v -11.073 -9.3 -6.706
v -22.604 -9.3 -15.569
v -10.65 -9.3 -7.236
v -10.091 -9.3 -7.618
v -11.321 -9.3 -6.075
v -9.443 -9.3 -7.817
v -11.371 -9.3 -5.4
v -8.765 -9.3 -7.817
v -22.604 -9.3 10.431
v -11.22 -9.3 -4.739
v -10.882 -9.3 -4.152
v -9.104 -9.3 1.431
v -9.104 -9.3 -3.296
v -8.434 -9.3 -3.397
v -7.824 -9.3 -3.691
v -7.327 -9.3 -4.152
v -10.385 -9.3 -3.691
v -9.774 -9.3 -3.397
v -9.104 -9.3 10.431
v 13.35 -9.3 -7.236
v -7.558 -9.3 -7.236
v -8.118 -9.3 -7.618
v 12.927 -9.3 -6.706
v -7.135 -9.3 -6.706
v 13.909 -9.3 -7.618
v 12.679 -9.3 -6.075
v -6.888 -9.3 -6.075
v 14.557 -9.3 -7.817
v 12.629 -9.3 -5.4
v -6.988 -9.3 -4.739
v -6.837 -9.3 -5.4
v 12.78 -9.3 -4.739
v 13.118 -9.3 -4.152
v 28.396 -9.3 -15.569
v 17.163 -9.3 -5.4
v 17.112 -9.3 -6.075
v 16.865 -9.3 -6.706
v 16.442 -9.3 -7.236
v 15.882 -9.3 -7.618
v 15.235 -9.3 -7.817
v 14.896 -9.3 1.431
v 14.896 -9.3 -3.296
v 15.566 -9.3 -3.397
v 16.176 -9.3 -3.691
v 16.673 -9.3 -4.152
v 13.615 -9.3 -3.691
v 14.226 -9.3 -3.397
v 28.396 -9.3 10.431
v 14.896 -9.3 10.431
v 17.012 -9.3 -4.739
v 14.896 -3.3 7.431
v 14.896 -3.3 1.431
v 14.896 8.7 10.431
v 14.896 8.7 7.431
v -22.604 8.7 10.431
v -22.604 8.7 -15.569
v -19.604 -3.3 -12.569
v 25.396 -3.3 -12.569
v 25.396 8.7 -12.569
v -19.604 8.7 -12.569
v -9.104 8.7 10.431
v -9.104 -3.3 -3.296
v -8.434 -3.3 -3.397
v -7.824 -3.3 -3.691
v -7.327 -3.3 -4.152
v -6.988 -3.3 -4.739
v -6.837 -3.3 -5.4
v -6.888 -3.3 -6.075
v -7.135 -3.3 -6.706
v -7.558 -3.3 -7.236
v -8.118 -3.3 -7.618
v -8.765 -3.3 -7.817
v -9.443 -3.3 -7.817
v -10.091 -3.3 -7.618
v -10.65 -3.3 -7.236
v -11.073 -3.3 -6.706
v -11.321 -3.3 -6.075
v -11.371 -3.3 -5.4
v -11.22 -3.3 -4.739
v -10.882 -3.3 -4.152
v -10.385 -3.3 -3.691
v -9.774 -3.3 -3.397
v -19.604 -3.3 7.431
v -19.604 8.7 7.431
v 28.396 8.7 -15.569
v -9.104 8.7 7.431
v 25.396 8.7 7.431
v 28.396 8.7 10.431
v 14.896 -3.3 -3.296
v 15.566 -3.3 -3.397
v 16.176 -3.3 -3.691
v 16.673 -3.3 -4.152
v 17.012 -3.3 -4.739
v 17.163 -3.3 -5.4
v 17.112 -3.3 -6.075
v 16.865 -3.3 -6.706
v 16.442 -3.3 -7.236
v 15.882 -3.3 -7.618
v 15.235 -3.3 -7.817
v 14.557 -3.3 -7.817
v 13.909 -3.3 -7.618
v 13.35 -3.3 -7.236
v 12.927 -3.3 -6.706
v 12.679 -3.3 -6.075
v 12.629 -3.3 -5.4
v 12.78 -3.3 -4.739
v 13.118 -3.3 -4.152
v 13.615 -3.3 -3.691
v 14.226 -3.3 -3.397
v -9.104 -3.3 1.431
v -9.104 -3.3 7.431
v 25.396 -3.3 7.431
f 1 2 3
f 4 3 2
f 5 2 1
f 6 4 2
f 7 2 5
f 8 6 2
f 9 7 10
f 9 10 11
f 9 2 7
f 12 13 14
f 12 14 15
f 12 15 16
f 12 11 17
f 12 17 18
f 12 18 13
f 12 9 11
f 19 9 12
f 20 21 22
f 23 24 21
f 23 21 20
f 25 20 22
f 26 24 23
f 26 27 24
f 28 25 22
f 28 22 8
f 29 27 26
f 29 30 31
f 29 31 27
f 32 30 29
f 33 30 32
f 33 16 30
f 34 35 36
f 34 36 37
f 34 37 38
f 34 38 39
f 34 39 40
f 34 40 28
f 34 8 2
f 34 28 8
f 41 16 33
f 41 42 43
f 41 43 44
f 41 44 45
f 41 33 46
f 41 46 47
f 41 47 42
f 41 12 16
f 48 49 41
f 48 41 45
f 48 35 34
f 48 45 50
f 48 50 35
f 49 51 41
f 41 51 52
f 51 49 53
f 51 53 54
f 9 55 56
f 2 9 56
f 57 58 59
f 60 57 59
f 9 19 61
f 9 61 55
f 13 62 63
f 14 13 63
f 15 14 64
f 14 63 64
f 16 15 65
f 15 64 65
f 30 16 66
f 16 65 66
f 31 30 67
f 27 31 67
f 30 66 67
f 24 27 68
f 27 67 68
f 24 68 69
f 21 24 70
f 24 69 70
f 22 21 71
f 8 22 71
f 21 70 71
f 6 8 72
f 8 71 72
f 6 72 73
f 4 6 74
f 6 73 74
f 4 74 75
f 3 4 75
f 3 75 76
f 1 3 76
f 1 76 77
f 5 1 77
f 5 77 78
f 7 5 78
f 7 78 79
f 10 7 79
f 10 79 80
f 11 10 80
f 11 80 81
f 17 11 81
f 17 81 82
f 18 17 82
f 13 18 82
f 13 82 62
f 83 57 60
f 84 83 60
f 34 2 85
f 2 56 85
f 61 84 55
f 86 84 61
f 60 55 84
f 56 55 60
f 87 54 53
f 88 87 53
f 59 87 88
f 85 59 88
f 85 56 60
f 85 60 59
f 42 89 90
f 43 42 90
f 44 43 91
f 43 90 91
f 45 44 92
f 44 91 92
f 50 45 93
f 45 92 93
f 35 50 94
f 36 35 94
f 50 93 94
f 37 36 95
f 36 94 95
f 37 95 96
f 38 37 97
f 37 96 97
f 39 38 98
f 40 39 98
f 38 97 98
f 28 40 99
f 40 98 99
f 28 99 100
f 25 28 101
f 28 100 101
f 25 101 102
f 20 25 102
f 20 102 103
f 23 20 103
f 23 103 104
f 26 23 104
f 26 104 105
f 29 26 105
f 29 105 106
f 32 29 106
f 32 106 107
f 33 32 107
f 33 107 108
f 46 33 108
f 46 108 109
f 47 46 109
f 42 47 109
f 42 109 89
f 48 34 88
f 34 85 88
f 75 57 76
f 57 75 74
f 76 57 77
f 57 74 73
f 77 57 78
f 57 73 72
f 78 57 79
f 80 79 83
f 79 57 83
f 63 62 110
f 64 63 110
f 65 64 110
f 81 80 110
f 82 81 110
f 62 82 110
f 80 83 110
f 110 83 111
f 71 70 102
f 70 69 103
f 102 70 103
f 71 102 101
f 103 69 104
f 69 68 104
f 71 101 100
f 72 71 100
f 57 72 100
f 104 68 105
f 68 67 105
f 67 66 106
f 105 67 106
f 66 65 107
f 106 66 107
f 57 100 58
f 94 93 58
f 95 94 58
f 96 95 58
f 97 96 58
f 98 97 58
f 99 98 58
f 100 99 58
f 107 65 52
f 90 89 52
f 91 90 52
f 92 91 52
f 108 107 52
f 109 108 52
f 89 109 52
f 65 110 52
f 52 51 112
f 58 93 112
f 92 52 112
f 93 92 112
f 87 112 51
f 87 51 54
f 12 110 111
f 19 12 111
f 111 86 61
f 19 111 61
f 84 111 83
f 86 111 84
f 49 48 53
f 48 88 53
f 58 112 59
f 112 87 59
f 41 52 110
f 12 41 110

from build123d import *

# Parameters (mm, degrees)
BOSS_EXTRUDE10_DEPTH = 3
SKETCH12_W           = 3
SKETCH12_H           = 12
BOSS_EXTRUDE11_DEPTH = 48
BOSS_EXTRUDE12_REACH = 39.563
SKETCH13_W           = 3
SKETCH13_H           = 12
CUT_EXTRUDE1_DEPTH   = 3
BOSS_EXTRUDE13_DEPTH = 6
CUT_EXTRUDE2_REACH   = 36.536
SKETCH16_R           = 2.2733


with BuildPart() as part:
    # Sketch10 → Boss-Extrude10 (new body)
    with BuildSketch(Plane(origin=(25.395802875, 0, 0), x_dir=(0, 0, -1), z_dir=(1, 0, 0))):
        Polygon((12.569444444, -3.3), (15.569444444, -3.3), (15.569444444, 8.7), (12.569444444, 8.7), (-7.430555556, 8.7), (-10.430555556, 8.7), (-10.430555556, -3.3), (-7.430555556, -3.3), align=None)
    extrude(amount=BOSS_EXTRUDE10_DEPTH)

    # Sketch12 → Boss-Extrude11 (add)
    with BuildSketch(Plane.ZY.offset(-25.395802875)):
        with Locations((-14.069444444, 2.7)):
            Rectangle(SKETCH12_W, SKETCH12_H)
        with Locations((8.930555556, 2.7)):
            Rectangle(SKETCH12_W, SKETCH12_H)
    extrude(amount=BOSS_EXTRUDE11_DEPTH)

    # Sketch13 → Boss-Extrude12 (add, up to next)
    with BuildSketch(Plane.XY.offset(-12.569444444), mode=Mode.PRIVATE) as boss_extrude12_sk1:
        with Locations((-21.104197125, 2.7)):
            Rectangle(SKETCH13_W, SKETCH13_H)
    boss_extrude12_tool1 = extrude(boss_extrude12_sk1.sketch, amount=BOSS_EXTRUDE12_REACH, mode=Mode.PRIVATE) - part.part
    add(boss_extrude12_tool1.solids().sort_by_distance((-21.104197, 2.7, -12.569444))[0])

    # Sketch14 → Cut-Extrude1 (cut)
    with BuildSketch(Plane.XY.offset(10.430555556)):
        Polygon((2.895802875, 8.7), (14.895802875, 8.7), (14.895802875, -3.3), (-9.104197125, -3.3), (-9.104197125, 8.7), align=None)
    extrude(amount=-CUT_EXTRUDE1_DEPTH, mode=Mode.SUBTRACT)

    # Sketch15 → Boss-Extrude13 (add)
    with BuildSketch(Plane.XZ.offset(3.3)):
        Polygon((-22.604197125, 10.430555556), (-22.604197125, -15.569444444), (28.395802875, -15.569444444), (28.395802875, 10.430555556), (14.895802875, 10.430555556), (14.895802875, 7.430555556), (14.895802875, 1.430555556), (-9.104197125, 1.430555556), (-9.104197125, 7.430555556), (-9.104197125, 10.430555556), align=None)
    extrude(amount=BOSS_EXTRUDE13_DEPTH)

    # Sketch16 → Cut-Extrude2 (cut, up to next)
    with BuildSketch(Plane(origin=(0, -3.3, 0), x_dir=(1, 0, 0), z_dir=(0, 1, 0)), mode=Mode.PRIVATE) as cut_extrude2_sk1:
        with Locations(Location((-9.104197125, 5.569444444, 0), (0, 0, 270))):
            Circle(SKETCH16_R)
    cut_extrude2_tool1 = extrude(cut_extrude2_sk1.sketch, amount=-CUT_EXTRUDE2_REACH, mode=Mode.PRIVATE) & part.part
    # Sketch16 → Cut-Extrude2 (cut, up to next)
    with BuildSketch(Plane(origin=(0, -3.3, 0), x_dir=(1, 0, 0), z_dir=(0, 1, 0)), mode=Mode.PRIVATE) as cut_extrude2_sk2:
        with Locations(Location((14.895802875, 5.569444444, 0), (0, 0, 270))):
            Circle(SKETCH16_R)
    cut_extrude2_tool2 = extrude(cut_extrude2_sk2.sketch, amount=-CUT_EXTRUDE2_REACH, mode=Mode.PRIVATE) & part.part
    add(cut_extrude2_tool1.solids().sort_by_distance((-9.104197, -3.3, -5.569444))[0], mode=Mode.SUBTRACT)
    add(cut_extrude2_tool2.solids().sort_by_distance((14.895803, -3.3, -5.569444))[0], mode=Mode.SUBTRACT)


solid = part.part
